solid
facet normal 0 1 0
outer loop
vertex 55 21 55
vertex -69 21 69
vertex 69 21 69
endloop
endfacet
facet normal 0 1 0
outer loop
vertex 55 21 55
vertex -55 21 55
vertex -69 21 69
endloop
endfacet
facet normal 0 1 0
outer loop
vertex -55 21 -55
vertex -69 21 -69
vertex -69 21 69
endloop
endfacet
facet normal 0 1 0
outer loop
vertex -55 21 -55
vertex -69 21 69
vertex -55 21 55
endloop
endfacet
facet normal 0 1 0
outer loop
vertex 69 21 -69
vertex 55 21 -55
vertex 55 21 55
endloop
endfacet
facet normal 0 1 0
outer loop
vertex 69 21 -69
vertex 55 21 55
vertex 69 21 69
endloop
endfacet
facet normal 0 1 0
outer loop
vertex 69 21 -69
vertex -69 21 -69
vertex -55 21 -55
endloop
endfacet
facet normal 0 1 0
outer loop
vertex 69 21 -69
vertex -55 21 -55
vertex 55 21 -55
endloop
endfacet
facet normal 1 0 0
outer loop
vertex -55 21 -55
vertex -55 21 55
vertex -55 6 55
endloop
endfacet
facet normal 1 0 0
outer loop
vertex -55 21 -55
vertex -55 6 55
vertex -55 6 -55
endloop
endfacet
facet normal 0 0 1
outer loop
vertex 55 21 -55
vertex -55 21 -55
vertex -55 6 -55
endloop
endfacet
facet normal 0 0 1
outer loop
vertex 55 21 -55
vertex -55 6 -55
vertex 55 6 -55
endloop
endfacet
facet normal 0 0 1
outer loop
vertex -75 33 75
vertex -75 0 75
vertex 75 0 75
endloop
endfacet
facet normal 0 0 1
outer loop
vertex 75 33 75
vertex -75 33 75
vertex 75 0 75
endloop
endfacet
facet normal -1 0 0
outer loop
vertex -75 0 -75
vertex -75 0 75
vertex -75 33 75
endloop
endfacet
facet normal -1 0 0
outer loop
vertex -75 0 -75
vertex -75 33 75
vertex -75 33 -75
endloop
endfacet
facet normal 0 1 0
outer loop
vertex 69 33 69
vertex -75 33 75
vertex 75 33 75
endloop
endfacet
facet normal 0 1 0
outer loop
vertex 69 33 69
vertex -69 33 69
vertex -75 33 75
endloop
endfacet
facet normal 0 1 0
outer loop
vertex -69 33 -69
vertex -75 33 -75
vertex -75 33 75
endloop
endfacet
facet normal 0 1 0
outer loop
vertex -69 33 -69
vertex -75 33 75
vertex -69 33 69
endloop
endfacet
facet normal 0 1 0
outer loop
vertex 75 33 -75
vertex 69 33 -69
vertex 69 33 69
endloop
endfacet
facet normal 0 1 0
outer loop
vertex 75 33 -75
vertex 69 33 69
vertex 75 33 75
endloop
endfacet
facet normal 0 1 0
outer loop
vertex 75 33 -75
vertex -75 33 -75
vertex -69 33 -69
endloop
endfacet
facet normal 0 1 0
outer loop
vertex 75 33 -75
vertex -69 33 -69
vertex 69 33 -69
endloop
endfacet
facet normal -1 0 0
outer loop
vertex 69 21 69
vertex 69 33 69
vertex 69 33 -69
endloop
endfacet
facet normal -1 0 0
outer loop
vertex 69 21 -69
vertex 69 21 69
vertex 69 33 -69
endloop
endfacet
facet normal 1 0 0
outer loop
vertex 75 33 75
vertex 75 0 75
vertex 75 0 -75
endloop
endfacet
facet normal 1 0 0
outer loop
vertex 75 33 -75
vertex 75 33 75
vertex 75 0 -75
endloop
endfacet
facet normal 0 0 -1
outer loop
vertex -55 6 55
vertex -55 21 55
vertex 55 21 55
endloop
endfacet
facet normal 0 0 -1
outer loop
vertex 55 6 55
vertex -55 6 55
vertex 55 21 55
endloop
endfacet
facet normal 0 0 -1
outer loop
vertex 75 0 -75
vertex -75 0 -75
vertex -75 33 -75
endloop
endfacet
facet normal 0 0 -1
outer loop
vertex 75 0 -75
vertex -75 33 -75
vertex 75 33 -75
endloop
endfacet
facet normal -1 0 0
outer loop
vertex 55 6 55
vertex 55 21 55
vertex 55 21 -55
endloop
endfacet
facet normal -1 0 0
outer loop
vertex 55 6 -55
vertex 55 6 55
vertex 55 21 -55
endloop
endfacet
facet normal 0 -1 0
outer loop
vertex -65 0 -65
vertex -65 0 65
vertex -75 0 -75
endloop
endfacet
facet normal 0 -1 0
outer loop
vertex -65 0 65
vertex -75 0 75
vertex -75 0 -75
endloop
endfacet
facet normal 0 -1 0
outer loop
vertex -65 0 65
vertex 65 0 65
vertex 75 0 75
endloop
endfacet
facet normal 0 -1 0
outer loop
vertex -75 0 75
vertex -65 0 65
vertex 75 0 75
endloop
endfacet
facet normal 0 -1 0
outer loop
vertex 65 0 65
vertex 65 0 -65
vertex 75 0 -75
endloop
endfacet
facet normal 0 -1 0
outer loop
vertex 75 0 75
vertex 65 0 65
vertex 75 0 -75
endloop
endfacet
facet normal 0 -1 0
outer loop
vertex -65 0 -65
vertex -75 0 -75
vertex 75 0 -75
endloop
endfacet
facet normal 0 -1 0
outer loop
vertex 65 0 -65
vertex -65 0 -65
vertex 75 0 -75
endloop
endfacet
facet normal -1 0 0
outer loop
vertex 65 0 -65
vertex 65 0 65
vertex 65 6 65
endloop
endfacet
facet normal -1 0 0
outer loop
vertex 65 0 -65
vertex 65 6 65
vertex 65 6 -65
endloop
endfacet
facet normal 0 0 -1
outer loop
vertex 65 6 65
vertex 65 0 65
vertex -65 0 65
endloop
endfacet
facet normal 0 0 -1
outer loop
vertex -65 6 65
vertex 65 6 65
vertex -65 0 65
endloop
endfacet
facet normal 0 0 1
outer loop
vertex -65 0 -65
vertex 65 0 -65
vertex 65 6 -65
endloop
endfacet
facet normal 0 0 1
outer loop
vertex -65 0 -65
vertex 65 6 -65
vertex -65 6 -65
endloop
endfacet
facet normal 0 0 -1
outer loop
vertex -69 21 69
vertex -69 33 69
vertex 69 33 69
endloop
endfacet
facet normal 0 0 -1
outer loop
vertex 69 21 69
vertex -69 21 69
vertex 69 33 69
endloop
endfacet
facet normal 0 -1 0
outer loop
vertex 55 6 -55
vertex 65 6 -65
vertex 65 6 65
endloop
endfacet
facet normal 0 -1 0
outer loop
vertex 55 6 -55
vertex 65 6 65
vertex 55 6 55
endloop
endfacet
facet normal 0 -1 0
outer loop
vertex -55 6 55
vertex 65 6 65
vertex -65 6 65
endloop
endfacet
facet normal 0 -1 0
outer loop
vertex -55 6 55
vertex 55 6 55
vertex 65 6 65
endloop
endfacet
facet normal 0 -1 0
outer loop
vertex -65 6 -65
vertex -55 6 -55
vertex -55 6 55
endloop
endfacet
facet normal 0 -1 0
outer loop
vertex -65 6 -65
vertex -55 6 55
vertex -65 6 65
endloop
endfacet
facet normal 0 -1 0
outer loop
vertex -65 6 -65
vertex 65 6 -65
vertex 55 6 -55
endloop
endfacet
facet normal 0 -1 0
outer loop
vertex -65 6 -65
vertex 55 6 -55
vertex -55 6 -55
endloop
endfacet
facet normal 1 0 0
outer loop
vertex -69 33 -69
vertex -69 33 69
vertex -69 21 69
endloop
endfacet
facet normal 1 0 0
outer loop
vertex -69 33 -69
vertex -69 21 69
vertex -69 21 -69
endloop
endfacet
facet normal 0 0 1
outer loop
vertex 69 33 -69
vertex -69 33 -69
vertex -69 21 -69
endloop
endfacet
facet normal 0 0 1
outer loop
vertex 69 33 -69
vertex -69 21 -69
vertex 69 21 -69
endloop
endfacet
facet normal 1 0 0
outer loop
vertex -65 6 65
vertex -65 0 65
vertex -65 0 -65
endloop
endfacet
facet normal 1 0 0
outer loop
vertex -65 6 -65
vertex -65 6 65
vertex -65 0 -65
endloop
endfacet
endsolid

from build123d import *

# Parameters (mm, degrees)
SKETCH_1_W          = 150
SKETCH_1_H          = 150
EXTRUDE_1_DEPTH     = 33
SKETCH_2_W          = 138
SKETCH_2_H          = 138
CUT_EXTRUDE_1_DEPTH = 12
SKETCH_3_W          = 130
SKETCH_3_H          = 130
CUT_EXTRUDE_2_DEPTH = 6
SKETCH_4_W          = 110
SKETCH_4_H          = 110
CUT_EXTRUDE_3_DEPTH = 109.124927746


with BuildPart() as part:
    # Эскиз1 → Бобышка-Вытянуть1 (new body)
    with BuildSketch(Plane(origin=(0, 0, 0), x_dir=(1, 0, 0), z_dir=(0, 1, 0))):
        Rectangle(SKETCH_1_W, SKETCH_1_H)
    extrude(amount=EXTRUDE_1_DEPTH)

    # Эскиз2 → Вырез-Вытянуть1 (cut)
    with BuildSketch(Plane(origin=(0, 33, 0), x_dir=(1, 0, 0), z_dir=(0, 1, 0))):
        Rectangle(SKETCH_2_W, SKETCH_2_H)
    extrude(amount=-CUT_EXTRUDE_1_DEPTH, mode=Mode.SUBTRACT)

    # Эскиз3 → Вырез-Вытянуть2 (cut)
    with BuildSketch(Plane(origin=(0, 0, 0), x_dir=(-1, 0, 0), z_dir=(0, -1, 0))):
        Rectangle(SKETCH_3_W, SKETCH_3_H)
    extrude(amount=-CUT_EXTRUDE_2_DEPTH, mode=Mode.SUBTRACT)

    # Эскиз4 → Вырез-Вытянуть3 (cut, through all)
    with BuildSketch(Plane(origin=(0, 21, 0), x_dir=(1, 0, 0), z_dir=(0, 1, 0))):
        Rectangle(SKETCH_4_W, SKETCH_4_H)
    extrude(amount=-CUT_EXTRUDE_3_DEPTH, mode=Mode.SUBTRACT)


solid = part.part
